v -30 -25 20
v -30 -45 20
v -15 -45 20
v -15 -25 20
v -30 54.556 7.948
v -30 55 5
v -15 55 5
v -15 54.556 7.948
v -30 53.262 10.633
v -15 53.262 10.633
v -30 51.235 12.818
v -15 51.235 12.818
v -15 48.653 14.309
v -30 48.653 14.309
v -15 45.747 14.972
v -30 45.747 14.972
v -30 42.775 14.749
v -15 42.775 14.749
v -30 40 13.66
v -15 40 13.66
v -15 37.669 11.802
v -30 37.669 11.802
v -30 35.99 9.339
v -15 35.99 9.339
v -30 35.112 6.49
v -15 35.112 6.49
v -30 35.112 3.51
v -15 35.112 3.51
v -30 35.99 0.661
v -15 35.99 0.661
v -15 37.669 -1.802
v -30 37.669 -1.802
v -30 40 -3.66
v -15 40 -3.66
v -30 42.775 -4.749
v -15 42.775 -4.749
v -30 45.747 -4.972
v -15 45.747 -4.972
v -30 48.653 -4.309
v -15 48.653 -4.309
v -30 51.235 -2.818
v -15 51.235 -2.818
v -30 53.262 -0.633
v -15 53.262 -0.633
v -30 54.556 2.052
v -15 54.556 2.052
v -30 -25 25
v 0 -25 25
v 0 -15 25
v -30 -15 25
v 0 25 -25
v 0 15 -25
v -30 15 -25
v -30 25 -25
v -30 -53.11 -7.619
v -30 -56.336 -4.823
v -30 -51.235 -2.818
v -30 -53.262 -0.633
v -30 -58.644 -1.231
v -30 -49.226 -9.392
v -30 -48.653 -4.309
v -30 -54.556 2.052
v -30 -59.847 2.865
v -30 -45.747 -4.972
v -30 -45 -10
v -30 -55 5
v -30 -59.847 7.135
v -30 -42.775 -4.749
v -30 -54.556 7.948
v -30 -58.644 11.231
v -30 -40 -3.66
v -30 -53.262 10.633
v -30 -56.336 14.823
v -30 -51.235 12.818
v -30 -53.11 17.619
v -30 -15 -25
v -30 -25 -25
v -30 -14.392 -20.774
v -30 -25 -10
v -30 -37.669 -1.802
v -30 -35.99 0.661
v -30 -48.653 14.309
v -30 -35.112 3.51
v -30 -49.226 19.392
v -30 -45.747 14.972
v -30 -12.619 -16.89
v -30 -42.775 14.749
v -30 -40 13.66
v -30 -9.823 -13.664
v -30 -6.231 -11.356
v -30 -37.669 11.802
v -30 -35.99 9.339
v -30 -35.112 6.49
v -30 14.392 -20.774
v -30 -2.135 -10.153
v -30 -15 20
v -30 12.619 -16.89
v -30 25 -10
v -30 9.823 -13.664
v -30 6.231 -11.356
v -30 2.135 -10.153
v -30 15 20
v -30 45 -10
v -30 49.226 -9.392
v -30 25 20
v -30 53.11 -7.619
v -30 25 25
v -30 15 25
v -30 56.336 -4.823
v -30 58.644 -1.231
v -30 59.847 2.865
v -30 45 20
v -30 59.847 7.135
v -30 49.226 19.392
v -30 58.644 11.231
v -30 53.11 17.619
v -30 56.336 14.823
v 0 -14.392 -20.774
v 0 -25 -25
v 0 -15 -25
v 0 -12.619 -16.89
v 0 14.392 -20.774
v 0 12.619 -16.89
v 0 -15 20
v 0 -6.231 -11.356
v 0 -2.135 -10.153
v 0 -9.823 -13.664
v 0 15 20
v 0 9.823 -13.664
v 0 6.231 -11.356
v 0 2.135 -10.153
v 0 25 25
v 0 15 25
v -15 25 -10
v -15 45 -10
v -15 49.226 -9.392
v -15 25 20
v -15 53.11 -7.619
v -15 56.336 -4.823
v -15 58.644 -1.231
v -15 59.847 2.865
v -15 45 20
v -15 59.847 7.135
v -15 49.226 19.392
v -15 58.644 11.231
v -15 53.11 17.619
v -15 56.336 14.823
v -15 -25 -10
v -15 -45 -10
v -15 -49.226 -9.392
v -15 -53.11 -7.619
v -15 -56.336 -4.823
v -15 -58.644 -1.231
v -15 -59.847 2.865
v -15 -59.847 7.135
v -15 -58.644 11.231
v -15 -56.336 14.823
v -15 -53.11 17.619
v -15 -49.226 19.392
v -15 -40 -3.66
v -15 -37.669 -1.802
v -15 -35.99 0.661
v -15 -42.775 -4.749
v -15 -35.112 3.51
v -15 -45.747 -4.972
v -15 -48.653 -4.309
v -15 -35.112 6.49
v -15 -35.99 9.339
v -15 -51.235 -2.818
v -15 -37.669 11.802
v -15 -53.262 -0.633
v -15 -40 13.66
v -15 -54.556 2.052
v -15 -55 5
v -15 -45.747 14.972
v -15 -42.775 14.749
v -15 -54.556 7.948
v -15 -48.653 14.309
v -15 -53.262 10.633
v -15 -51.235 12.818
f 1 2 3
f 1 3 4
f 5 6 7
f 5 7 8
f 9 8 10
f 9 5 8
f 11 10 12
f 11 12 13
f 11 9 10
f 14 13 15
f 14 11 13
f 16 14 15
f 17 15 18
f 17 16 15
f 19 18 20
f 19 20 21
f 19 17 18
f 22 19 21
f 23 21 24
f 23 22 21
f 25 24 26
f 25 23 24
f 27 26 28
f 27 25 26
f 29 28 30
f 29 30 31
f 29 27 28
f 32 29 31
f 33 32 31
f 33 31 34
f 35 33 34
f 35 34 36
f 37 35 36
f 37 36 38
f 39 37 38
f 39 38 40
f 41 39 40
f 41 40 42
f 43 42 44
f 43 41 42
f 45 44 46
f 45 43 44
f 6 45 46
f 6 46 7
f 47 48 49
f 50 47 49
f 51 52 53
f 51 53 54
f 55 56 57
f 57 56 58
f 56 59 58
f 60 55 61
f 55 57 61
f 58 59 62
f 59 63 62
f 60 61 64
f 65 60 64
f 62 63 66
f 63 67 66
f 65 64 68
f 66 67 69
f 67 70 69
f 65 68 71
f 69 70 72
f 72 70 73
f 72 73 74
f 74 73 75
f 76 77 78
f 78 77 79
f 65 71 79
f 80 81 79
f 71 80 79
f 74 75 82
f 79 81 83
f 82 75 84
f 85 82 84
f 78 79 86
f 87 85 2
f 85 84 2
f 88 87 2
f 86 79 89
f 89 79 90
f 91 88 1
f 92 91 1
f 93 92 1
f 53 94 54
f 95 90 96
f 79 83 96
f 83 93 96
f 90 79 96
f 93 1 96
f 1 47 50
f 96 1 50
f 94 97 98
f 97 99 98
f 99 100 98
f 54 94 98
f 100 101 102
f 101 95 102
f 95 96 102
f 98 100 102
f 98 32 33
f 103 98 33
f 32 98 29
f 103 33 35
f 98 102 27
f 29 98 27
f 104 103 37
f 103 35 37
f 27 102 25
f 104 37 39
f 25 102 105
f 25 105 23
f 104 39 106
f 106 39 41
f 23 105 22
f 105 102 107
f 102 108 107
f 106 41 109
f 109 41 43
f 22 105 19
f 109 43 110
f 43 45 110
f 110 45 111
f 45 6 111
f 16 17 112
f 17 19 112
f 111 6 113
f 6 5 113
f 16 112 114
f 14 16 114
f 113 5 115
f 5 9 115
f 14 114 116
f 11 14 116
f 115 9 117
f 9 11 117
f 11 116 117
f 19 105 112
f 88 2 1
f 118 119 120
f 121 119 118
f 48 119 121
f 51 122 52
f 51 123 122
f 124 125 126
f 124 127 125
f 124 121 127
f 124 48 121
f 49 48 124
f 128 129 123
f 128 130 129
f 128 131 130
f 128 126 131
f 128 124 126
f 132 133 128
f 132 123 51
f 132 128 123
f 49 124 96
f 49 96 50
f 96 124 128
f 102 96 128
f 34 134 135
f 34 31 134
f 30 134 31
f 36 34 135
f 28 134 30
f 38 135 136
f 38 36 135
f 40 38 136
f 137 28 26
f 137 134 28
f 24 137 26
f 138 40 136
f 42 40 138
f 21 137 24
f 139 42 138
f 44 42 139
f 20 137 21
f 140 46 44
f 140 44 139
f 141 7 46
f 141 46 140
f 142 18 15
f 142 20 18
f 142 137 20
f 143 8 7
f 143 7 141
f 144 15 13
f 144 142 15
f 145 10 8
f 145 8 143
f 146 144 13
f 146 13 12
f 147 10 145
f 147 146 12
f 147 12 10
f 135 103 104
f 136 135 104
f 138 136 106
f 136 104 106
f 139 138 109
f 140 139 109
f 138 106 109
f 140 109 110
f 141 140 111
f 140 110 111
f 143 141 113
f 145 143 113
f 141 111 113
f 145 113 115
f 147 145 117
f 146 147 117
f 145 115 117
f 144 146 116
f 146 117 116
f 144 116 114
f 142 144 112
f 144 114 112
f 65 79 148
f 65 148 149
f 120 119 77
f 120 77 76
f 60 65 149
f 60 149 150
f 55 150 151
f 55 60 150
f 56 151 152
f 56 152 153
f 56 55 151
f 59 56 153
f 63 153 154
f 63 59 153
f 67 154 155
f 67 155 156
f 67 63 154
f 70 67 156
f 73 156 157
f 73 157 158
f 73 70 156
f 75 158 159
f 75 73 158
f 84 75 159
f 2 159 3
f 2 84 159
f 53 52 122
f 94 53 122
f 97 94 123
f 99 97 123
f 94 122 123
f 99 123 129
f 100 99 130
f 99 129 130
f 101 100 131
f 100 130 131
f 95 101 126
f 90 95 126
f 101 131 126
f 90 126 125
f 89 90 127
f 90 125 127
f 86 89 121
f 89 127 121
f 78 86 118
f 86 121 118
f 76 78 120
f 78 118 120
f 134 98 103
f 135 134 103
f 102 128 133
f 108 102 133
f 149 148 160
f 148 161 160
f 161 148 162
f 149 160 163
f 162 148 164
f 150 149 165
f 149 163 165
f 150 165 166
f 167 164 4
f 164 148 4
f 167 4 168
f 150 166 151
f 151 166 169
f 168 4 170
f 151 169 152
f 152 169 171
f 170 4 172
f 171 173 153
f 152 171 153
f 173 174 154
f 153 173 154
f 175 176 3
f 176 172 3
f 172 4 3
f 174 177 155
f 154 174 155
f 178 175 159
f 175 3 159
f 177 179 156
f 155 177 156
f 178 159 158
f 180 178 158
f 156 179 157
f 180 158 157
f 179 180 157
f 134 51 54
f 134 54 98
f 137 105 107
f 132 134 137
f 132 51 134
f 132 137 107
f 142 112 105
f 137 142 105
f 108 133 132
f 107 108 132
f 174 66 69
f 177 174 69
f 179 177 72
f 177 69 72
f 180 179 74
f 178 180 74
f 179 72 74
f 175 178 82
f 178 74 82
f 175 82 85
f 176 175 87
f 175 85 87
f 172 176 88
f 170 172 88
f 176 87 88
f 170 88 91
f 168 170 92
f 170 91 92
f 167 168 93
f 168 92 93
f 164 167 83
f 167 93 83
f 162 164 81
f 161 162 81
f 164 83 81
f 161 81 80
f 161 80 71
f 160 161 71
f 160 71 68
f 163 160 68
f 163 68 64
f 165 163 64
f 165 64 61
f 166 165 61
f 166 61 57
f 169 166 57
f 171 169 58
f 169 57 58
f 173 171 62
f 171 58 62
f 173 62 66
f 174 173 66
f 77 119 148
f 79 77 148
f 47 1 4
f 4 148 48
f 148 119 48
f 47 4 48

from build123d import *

# Parameters (mm, degrees)
F0_W     = 50
F0_H     = 50
F1_DEPTH = 30
F2_W     = 30
F2_H     = 5
F2_R     = 15
F3_DEPTH = 30.001
F4_R     = 10
F5_DEPTH = 15


# Not quite as in the source:
# - a pattern or mirror of a feature is missing from the dataset's text; its kind, count and spacing are read off the source's solid


with BuildPart() as f1:
    # F0 (on Right) → F1 (new body)
    with BuildSketch(Plane.YZ):
        Rectangle(F0_W, F0_H)
    extrude(amount=-F1_DEPTH)

    # F2 (on face) → F3 (cut, through all)
    with BuildSketch(Plane.YZ):
        with Locations((0, 22.5)):
            Rectangle(F2_W, F2_H)
        with Locations((0, -25)):
            Circle(F2_R)
    extrude(amount=-F3_DEPTH, mode=Mode.SUBTRACT)

    # F4 (on face) → F5 (join)
    with BuildSketch(Plane(origin=(-30, 0, 0), x_dir=(0, -1, 0), z_dir=(-1, 0, 0))):
        with BuildLine():
            Line((45, 20), (25, 20))
            Line((25, 20), (25, -10))
            Line((25, -10), (45, -10))
            ThreePointArc((45, -10), (55.6066017178, -5.6066017178), (60, 5))
            ThreePointArc((60, 5), (55.6066017178, 15.6066017178), (45, 20))
        make_face()
        with Locations((45, 5)):
            Circle(F4_R, mode=Mode.SUBTRACT)
    f5 = extrude(amount=-F5_DEPTH)

    # F5_copies: F5 across plane
    add(f5.mirror(Plane.ZX))


solid = f1.part
